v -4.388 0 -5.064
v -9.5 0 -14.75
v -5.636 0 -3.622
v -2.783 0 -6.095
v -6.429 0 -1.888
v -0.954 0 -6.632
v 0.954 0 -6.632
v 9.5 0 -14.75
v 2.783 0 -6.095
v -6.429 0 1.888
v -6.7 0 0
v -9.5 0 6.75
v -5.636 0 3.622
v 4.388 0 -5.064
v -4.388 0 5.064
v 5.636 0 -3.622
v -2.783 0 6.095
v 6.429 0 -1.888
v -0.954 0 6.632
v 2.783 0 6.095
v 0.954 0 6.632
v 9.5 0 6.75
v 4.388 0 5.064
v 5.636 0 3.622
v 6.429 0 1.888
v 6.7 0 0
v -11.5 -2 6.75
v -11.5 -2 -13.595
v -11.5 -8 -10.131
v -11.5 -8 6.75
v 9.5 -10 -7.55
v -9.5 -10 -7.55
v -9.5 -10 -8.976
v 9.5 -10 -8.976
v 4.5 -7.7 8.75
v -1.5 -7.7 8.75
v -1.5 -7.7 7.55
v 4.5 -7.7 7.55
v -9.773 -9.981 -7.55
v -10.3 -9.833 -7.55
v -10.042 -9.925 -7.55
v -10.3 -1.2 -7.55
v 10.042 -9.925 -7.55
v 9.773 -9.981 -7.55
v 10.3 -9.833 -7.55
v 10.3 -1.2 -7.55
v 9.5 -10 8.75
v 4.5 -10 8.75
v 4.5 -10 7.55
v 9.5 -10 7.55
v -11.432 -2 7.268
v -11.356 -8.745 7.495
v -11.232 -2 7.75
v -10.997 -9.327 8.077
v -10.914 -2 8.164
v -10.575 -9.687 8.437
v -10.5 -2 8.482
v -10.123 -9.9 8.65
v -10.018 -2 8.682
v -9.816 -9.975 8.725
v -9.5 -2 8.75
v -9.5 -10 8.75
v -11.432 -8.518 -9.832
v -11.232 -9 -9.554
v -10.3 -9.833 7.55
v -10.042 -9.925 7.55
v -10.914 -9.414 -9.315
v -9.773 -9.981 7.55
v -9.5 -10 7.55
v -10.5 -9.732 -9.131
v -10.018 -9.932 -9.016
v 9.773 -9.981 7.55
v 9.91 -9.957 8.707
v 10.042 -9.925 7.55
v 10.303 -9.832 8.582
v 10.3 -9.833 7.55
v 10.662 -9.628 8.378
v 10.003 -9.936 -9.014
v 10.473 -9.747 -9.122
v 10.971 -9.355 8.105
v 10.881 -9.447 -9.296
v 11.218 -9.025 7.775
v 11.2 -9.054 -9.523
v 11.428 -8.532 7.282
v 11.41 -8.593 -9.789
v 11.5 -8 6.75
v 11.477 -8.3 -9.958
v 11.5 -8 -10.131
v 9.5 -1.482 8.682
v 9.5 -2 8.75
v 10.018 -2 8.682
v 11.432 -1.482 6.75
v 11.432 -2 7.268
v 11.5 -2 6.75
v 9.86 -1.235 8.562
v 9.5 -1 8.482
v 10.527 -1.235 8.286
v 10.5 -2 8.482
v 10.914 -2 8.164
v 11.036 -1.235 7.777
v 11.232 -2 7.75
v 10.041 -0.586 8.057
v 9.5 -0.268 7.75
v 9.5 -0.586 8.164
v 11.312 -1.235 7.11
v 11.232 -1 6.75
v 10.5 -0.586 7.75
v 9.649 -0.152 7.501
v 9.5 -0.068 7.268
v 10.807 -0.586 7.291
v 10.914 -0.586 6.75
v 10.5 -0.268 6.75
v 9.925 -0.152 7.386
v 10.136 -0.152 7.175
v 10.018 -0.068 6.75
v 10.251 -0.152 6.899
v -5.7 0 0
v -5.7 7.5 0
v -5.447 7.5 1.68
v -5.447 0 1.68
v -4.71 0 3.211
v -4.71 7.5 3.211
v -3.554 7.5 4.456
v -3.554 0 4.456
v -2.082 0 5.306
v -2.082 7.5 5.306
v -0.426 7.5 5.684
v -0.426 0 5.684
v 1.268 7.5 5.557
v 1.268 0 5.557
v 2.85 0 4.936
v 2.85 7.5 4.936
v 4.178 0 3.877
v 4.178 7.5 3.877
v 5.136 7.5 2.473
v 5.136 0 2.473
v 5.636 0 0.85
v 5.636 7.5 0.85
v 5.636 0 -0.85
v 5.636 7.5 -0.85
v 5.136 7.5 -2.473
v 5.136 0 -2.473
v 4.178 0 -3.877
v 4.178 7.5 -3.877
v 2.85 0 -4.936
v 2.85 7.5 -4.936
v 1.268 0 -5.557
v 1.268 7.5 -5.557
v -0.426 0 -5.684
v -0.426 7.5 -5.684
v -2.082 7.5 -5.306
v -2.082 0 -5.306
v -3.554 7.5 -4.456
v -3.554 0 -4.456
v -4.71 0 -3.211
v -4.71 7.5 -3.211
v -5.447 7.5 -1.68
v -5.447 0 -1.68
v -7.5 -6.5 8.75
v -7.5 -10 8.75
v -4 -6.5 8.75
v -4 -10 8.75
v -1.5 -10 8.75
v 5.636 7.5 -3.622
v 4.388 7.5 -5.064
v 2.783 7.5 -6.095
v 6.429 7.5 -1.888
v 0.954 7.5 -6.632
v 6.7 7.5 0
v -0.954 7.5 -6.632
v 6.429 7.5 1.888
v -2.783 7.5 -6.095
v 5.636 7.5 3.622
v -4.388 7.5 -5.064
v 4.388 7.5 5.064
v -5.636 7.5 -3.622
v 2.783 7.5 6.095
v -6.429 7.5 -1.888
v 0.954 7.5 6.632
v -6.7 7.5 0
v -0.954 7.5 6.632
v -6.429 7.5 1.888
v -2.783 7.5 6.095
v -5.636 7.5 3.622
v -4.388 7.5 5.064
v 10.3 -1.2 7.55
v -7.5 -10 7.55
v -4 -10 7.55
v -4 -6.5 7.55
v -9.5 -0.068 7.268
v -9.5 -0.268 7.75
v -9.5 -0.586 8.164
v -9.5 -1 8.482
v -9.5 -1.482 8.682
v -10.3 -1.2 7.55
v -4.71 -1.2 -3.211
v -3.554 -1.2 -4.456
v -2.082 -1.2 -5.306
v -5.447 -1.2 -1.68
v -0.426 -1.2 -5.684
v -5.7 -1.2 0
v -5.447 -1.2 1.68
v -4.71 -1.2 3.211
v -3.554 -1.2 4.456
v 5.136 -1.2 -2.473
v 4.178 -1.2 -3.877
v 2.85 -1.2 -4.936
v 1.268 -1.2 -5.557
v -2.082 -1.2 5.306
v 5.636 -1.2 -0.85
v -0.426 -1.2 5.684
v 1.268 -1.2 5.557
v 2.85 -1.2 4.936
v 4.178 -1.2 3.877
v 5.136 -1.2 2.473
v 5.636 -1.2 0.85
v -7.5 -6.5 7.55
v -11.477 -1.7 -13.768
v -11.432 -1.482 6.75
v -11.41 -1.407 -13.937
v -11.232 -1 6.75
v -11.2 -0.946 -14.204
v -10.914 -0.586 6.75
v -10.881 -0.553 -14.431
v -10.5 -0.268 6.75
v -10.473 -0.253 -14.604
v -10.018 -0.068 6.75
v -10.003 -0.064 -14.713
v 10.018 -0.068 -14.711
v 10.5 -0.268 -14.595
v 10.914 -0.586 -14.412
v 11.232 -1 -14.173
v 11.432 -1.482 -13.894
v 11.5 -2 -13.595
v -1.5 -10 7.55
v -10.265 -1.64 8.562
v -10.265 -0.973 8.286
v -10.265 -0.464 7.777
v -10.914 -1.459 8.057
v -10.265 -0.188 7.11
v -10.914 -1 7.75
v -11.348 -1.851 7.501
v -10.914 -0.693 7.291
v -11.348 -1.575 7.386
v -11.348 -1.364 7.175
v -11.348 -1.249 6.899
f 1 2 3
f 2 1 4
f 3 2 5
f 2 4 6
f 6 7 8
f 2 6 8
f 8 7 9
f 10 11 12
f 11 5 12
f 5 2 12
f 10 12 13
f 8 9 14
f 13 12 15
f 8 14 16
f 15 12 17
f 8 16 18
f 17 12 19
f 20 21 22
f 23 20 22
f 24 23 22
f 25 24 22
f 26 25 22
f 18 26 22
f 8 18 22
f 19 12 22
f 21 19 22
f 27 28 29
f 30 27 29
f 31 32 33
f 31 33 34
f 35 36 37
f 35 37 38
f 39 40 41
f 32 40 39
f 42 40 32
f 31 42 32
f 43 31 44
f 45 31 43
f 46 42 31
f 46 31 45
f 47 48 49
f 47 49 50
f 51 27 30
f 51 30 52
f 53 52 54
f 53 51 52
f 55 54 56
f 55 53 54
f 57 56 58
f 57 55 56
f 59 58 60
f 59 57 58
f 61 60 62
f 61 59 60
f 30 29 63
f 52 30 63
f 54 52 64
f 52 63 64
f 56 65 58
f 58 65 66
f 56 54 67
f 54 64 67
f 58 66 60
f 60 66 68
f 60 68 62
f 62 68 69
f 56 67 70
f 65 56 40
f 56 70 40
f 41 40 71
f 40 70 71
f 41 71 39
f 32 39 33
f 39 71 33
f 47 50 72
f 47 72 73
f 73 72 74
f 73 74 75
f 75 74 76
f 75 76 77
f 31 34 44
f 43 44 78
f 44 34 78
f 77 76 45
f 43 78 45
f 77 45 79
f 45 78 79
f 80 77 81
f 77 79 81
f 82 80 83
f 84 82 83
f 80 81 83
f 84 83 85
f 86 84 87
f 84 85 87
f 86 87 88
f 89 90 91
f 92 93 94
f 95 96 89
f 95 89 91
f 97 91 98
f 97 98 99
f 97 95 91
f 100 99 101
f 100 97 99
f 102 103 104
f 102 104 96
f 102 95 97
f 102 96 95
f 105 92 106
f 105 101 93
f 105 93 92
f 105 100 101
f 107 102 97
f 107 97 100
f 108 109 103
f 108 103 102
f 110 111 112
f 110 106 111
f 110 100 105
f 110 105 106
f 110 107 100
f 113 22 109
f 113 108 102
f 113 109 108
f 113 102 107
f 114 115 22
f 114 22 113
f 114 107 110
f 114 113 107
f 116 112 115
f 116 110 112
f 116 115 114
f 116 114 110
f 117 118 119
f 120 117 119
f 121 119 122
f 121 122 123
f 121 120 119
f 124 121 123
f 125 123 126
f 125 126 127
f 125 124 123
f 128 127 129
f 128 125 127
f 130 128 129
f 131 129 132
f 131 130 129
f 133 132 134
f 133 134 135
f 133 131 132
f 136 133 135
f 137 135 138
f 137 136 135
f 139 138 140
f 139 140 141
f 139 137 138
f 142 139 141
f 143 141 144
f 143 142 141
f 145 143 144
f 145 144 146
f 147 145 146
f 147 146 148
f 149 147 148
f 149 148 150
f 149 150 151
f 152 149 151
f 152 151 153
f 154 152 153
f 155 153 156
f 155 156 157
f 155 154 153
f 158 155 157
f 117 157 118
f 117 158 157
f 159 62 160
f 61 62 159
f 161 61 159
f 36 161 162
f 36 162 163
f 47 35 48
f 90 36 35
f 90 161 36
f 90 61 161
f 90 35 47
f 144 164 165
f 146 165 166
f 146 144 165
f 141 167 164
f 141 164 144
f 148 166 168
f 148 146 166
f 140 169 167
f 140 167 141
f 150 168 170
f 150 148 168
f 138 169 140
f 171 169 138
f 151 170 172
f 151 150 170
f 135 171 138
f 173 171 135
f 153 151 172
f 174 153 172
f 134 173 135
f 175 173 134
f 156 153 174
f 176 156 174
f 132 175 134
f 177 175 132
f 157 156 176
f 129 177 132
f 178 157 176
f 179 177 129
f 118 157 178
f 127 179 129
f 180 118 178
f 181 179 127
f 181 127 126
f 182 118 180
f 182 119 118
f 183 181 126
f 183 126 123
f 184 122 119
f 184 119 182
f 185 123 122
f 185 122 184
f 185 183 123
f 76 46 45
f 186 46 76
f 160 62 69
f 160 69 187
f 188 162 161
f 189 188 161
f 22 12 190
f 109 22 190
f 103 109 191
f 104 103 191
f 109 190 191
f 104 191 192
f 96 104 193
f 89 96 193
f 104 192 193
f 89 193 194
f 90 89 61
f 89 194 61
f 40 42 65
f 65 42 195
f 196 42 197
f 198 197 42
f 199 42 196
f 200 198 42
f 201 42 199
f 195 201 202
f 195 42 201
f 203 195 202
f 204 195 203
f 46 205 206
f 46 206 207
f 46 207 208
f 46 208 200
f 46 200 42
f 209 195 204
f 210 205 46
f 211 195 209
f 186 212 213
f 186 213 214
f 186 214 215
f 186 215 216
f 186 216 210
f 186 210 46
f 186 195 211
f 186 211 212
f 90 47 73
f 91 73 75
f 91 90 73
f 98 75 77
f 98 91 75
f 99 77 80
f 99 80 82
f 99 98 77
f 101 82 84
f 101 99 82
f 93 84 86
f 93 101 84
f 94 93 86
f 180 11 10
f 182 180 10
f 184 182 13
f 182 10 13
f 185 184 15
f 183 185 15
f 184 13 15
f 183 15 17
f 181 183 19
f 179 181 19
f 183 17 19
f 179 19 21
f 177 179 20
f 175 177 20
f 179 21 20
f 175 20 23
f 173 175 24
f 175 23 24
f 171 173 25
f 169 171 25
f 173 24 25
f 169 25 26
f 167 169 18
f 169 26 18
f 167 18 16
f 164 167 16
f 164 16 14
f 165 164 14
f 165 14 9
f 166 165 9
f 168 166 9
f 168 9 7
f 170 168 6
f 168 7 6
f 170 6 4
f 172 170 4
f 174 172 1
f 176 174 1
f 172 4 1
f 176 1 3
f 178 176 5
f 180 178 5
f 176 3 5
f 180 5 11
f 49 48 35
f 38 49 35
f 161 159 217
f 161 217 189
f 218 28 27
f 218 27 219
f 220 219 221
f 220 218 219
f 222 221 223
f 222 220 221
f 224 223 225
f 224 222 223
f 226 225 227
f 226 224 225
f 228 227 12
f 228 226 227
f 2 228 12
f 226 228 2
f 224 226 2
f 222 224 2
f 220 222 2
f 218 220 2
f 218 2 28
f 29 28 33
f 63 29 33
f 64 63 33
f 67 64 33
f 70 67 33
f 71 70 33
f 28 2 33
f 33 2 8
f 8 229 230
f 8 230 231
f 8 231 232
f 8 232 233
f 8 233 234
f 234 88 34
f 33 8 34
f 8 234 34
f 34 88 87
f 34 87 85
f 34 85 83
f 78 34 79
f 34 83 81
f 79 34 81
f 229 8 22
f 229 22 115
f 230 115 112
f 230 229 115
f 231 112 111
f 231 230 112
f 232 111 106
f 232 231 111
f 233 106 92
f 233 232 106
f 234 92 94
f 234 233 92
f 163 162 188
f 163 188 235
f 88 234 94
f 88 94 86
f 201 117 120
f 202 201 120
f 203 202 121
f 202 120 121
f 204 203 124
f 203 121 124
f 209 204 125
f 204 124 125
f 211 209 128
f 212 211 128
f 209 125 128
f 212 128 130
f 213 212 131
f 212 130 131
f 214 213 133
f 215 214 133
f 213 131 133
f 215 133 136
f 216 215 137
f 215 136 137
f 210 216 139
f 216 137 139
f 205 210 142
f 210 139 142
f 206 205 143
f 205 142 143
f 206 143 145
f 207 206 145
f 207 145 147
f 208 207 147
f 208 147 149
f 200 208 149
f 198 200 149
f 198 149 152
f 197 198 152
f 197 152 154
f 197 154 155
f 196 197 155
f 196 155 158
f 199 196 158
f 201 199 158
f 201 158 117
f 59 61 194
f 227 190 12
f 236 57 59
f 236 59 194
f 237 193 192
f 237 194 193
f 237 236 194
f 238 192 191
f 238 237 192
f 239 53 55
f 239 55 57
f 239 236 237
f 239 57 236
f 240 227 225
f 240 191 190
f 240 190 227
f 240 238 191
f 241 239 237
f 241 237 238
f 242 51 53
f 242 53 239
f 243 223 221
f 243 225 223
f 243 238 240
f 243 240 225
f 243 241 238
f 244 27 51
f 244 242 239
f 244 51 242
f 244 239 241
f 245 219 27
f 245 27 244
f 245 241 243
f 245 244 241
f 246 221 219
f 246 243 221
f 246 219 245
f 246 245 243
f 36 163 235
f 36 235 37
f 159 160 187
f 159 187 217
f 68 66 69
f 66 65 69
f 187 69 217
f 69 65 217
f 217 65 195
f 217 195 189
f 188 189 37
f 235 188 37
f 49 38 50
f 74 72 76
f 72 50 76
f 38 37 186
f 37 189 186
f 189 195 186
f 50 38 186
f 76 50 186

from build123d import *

# Parameters (mm, degrees)
F0_W          = 23
F0_H          = 17.5
F1_DEPTH      = 10
F2_T          = -1.2
F3_R          = 5.7
F4_DEPTH      = 3
F3_R_2        = 6.7
F5_DEPTH      = 7.5
F6_W          = 6
F6_H          = 2.3
F6_W_2        = 3.5
F6_H_2        = 3.5
F7_DEPTH      = 4
F8_DEPTH      = 6
F10_DEPTH     = 30
F11_T1_DEPTH  = 19
F11_T3_DEPTH  = 26.5
F11_T5_DEPTH  = 13
F11_T7_DEPTH  = 27.7264973081
F11_S11_W     = 2
F11_S11_H     = 2
F11_T12_DEPTH = 2
F11_S17_W     = 2
F11_S17_H     = 2
F11_T18_DEPTH = 2


# Not quite as in the source:
# - a fillet or chamfer that OpenCascade refuses, or shapes differently, is made with other operations: its cross-section is extruded or revolved along the edge and cut away or added


with BuildPart() as f1:
    # F0 (on Front) → F1 (new body)
    with BuildSketch(Plane.XZ):
        Rectangle(F0_W, F0_H)
    extrude(amount=F1_DEPTH)

    # F2
    f2_openings = [f1.faces().sort_by_distance(p)[0] for p in [
        (0, -10, 0),
    ]]
    offset(amount=F2_T, openings=f2_openings)

    # F3 (on face) → F4 (cut)
    with BuildSketch(Plane(origin=(0, 0, 0), x_dir=(-1, 0, 0), z_dir=(0, 1, 0))):
        Circle(F3_R)
    extrude(amount=-F4_DEPTH, mode=Mode.SUBTRACT)

    # F3 (on face) → F5 (join)
    with BuildSketch(Plane(origin=(0, 0, 0), x_dir=(-1, 0, 0), z_dir=(0, 1, 0))):
        Circle(F3_R_2)
        Circle(F3_R, mode=Mode.SUBTRACT)
    extrude(amount=F5_DEPTH)

    # F6 (on face) → F7 (cut)
    with BuildSketch(Plane.XY.offset(8.75)):
        with Locations((1.5, -8.85)):
            Rectangle(F6_W, F6_H)
        with Locations((-5.75, -8.25)):
            Rectangle(F6_W_2, F6_H_2)
    extrude(amount=-F7_DEPTH, mode=Mode.SUBTRACT)

    # F8 (add): a face of the model
    f8_faces = [f1.faces().sort_by_distance(p)[0] for p in [
        (0, -5, -8.75),
    ]]
    extrude(f8_faces, amount=F8_DEPTH)

    # F9 (on face) → F10 (cut)
    with BuildSketch(Plane.YZ.offset(11.5)):
        Polygon((-10, -14.75), (0, -14.75), (-10, -8.9764973081), align=None)
    extrude(amount=-F10_DEPTH, mode=Mode.SUBTRACT)

    # F11: fillet of radius 2 on 7 edges, made by hand

    # F11_s2 → F11_t1 (cut)
    with BuildSketch(Plane.YZ.offset(-9.5)):
        with BuildLine():
            ThreePointArc((0, 6.75), (-0.5857864376, 8.1642135624), (-2, 8.75))
            Line((-2, 8.75), (0, 8.75))
            Line((0, 8.75), (0, 6.75))
        make_face()
    extrude(amount=F11_T1_DEPTH, mode=Mode.SUBTRACT)

    # F11_s4 → F11_t3 (cut)
    with BuildSketch(Plane.XY.offset(-19.75)):
        with BuildLine():
            ThreePointArc((-11.5, -2), (-10.9142135624, -0.5857864376), (-9.5, 0))
            Line((-9.5, 0), (-11.5, 0))
            Line((-11.5, 0), (-11.5, -2))
        make_face()
        with BuildLine():
            ThreePointArc((9.5, 0), (10.9142135624, -0.5857864376), (11.5, -2))
            Line((11.5, -2), (11.5, 0))
            Line((11.5, 0), (9.5, 0))
        make_face()
    extrude(amount=F11_T3_DEPTH, mode=Mode.SUBTRACT)

    # F11_s6 → F11_t5 (cut)
    with BuildSketch(Plane.XZ.offset(2)):
        with BuildLine():
            ThreePointArc((9.5, 8.75), (10.9142135624, 8.1642135624), (11.5, 6.75))
            Line((11.5, 6.75), (11.5, 8.75))
            Line((11.5, 8.75), (9.5, 8.75))
        make_face()
        with BuildLine():
            ThreePointArc((-11.5, 6.75), (-10.9142135624, 8.1642135624), (-9.5, 8.75))
            Line((-9.5, 8.75), (-11.5, 8.75))
            Line((-11.5, 8.75), (-11.5, 6.75))
        make_face()
    extrude(amount=F11_T5_DEPTH, mode=Mode.SUBTRACT)

    # F11_s8 → F11_t7 (cut)
    with BuildSketch(Plane.XY.offset(-13.9764973081)):
        with BuildLine():
            ThreePointArc((-11.5, -8), (-10.9142135624, -9.4142135624), (-9.5, -10))
            Line((-9.5, -10), (-11.5, -10))
            Line((-11.5, -10), (-11.5, -8))
        make_face()
        with BuildLine():
            ThreePointArc((9.5, -10), (10.9142135624, -9.4142135624), (11.5, -8))
            Line((11.5, -8), (11.5, -10))
            Line((11.5, -10), (9.5, -10))
        make_face()
    extrude(amount=F11_T7_DEPTH, mode=Mode.SUBTRACT)


with BuildPart() as f11_tool10:
    # F11_s11 → F11_t12 (new body)
    with BuildSketch(Plane.XZ.offset(2)):
        with Locations((10.5, 7.75)):
            Rectangle(F11_S11_W, F11_S11_H)
    extrude(amount=-F11_T12_DEPTH)

    # F11_s13 → F11_t14 (revolve, cut)
    with BuildSketch(Plane(origin=(9.5, -2, 6.75), x_dir=(-0.7071067812, 0, -0.7071067812), z_dir=(0.7071067812, 0, -0.7071067812))):
        with BuildLine():
            ThreePointArc((0, -2), (2, 0), (0, 2))
            Line((0, 2), (0, -2))
        make_face()
    revolve(axis=Axis((9.5, -2, 6.75), (0, 1, 0)), mode=Mode.SUBTRACT)


with BuildPart() as f1_1:
    add(f1.part)

    # F11_t9: cut F11_tool10
    add(f11_tool10.part, mode=Mode.SUBTRACT)


with BuildPart() as f11_tool16:
    # F11_s17 → F11_t18 (new body)
    with BuildSketch(Plane.YZ.offset(-9.5)):
        with Locations((-1, 7.75)):
            Rectangle(F11_S17_W, F11_S17_H)
    extrude(amount=-F11_T18_DEPTH)

    # F11_s19 → F11_t20 (revolve, cut)
    with BuildSketch(Plane(origin=(-9.5, -2, 6.75), x_dir=(0, -0.7071067812, -0.7071067812), z_dir=(0, 0.7071067812, -0.7071067812))):
        with BuildLine():
            ThreePointArc((0, -2), (2, 0), (0, 2))
            Line((0, 2), (0, -2))
        make_face()
    revolve(axis=Axis((-9.5, -2, 6.75), (-1, 0, 0)), mode=Mode.SUBTRACT)


with BuildPart() as f1_2:
    add(f1_1.part)

    # F11_t15: cut F11_tool16
    add(f11_tool16.part, mode=Mode.SUBTRACT)


solid = f1_2.part
